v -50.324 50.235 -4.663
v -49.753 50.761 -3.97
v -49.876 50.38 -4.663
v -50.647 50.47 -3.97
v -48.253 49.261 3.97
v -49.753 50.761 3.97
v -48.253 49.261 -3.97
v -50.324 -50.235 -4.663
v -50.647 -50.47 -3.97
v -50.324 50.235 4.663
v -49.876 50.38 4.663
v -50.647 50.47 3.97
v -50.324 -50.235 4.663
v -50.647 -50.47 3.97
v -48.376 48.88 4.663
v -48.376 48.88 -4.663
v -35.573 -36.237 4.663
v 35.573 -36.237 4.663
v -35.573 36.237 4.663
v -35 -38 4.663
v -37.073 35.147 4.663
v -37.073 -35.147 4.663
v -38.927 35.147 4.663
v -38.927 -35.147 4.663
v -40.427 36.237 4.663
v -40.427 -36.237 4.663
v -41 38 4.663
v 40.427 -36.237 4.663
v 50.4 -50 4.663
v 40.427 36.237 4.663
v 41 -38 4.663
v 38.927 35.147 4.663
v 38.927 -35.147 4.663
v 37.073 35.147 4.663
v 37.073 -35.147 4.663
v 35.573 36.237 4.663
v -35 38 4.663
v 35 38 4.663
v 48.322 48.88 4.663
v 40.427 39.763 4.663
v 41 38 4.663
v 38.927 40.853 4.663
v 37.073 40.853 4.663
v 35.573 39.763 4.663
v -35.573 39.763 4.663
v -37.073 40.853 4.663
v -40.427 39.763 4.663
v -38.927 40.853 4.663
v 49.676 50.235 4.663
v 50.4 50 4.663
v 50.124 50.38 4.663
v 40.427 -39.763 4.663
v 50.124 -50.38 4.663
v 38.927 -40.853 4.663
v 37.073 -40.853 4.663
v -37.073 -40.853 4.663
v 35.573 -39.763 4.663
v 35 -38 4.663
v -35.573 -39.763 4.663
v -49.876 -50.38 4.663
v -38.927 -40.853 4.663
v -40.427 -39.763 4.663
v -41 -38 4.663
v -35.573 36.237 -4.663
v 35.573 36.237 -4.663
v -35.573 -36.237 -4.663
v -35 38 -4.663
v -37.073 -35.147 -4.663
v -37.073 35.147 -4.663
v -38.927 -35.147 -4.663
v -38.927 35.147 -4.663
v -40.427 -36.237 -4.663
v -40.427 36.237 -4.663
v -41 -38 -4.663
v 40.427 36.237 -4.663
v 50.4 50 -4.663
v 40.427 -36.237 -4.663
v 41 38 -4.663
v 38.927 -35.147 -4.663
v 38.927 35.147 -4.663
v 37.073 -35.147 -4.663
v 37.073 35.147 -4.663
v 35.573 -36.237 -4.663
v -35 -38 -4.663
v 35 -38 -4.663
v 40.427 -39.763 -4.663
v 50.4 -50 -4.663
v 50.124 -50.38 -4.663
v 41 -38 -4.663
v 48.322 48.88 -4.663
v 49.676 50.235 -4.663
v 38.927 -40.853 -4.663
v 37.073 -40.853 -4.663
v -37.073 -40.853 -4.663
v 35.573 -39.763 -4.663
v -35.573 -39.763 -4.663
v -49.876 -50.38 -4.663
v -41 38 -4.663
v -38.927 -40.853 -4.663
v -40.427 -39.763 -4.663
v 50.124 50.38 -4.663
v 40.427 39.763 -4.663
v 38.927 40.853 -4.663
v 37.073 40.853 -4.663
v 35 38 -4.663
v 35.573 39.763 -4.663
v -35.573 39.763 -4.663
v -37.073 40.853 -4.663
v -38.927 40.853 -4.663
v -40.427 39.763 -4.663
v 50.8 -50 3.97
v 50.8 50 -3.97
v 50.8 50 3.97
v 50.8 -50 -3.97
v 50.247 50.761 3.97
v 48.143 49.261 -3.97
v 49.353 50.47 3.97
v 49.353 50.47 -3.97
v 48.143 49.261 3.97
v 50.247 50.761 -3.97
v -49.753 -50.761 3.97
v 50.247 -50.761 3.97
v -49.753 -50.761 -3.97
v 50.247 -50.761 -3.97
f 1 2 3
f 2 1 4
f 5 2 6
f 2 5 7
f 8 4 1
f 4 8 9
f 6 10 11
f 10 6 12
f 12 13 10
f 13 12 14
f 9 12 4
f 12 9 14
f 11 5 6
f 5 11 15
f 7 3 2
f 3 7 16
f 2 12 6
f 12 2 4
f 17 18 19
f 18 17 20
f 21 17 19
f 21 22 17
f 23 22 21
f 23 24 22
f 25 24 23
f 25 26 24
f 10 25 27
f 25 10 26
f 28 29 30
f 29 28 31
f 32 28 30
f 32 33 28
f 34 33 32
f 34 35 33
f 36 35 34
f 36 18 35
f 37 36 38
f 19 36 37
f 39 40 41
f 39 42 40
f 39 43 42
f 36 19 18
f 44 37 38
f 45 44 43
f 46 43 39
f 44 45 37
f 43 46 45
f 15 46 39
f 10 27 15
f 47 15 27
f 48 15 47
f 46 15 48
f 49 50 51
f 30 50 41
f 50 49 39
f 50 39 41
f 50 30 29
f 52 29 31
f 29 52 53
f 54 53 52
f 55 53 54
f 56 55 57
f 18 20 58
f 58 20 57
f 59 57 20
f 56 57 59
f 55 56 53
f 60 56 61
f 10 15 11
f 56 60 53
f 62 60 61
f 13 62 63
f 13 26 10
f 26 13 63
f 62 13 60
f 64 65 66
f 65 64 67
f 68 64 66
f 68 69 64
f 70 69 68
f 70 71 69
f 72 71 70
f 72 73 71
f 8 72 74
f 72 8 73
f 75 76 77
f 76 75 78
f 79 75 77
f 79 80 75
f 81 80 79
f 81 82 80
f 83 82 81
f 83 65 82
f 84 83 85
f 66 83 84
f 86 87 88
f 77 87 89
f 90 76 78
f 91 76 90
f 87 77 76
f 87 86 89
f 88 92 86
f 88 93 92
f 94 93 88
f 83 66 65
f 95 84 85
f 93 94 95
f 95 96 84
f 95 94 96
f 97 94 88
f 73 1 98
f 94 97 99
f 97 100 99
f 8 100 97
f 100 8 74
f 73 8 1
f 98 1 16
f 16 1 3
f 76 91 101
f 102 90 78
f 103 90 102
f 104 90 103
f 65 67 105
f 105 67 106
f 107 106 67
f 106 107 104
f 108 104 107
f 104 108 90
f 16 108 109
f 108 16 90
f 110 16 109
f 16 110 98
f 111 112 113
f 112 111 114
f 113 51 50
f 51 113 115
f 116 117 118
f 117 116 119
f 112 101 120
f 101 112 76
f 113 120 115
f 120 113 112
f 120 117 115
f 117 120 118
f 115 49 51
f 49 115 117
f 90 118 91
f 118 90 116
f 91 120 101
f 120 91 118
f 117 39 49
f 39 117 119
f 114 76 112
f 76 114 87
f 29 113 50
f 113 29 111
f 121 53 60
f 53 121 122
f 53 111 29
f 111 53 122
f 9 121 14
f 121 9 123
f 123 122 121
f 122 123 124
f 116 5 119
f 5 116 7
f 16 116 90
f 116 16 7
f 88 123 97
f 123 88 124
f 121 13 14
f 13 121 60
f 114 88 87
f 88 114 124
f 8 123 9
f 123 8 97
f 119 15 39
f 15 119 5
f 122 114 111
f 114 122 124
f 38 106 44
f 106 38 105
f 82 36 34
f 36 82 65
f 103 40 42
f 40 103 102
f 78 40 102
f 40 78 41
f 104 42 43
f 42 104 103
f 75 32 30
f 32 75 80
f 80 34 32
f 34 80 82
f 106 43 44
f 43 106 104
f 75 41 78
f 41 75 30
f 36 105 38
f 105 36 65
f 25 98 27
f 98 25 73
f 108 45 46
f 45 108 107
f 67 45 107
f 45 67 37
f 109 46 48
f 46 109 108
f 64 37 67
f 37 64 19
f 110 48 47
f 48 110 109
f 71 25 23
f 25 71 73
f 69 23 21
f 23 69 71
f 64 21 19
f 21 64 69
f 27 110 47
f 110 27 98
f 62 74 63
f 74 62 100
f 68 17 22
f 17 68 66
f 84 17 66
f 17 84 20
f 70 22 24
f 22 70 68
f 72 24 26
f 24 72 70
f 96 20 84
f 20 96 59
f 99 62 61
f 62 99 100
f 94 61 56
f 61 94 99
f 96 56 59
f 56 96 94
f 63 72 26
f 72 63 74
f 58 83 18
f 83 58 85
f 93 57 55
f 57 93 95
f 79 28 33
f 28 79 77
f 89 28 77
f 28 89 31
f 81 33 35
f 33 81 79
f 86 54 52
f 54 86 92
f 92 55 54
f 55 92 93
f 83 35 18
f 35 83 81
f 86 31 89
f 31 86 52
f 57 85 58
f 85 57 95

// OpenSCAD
// Parameters
sheet_length = 100; //[50:200:1]
sheet_width = 100; //[50:200:1]
sheet_thickness = 7.94; //[4:16:0.01]
edge_chamfer_size = 1.5; //[0.5:4:0.1]
edge_fillet_radius = 2; //[0.5:6:0.1]
mount_hole_diameter = 6; //[3:12:0.1]
mount_hole_edge_offset = 12; //[6:30:0.5]
hole_clearance_z = 2; //[1:6:0.5]
rounding_sphere_radius = 0.8; //[0.2:2:0.1]

// Base shapes
module sheet_body() {
  cube([sheet_length, sheet_width, sheet_thickness], center=true);
}

module edge_chamfer() {
  linear_extrude(height=sheet_thickness, center=true) {
    polygon(points=[
      [sheet_length/2, sheet_width/2],
      [sheet_length/2 - edge_chamfer_size, sheet_width/2 - edge_chamfer_size],
      [-sheet_length/2 + edge_chamfer_size, sheet_width/2 - edge_chamfer_size],
      [-sheet_length/2, sheet_width/2]
    ]);
  }
}

module edge_fillet() {
  sphere(r=rounding_sphere_radius, center=true);
}

module mounting_hole_cyl(pos) {
  translate(pos)
    cylinder(r=mount_hole_diameter/2, h=sheet_thickness + hole_clearance_z, center=true);
}

// Operations
module mounting_holes() {
  union() {
    mounting_hole_cyl([sheet_length/2 - mount_hole_edge_offset, sheet_width/2 - mount_hole_edge_offset, 0]);
    mounting_hole_cyl([-sheet_length/2 + mount_hole_edge_offset, sheet_width/2 - mount_hole_edge_offset, 0]);
    mounting_hole_cyl([-sheet_length/2 + mount_hole_edge_offset, -sheet_width/2 + mount_hole_edge_offset, 0]);
    mounting_hole_cyl([sheet_length/2 - mount_hole_edge_offset, -sheet_width/2 + mount_hole_edge_offset, 0]);
  }
}

module sheet_with_chamfer_band() {
  difference() {
    sheet_body();
    edge_chamfer();
  }
}

module sheet_with_edge_fillet() {
  minkowski() {
    sheet_with_chamfer_band();
    edge_fillet();
  }
}

// Final model
module complete_model() {
  difference() {
    sheet_with_edge_fillet();
    mounting_holes();
  }
}

// Render the complete model
color([0.85, 0.85, 0.8]) // Off-white color for the sheet
complete_model();
